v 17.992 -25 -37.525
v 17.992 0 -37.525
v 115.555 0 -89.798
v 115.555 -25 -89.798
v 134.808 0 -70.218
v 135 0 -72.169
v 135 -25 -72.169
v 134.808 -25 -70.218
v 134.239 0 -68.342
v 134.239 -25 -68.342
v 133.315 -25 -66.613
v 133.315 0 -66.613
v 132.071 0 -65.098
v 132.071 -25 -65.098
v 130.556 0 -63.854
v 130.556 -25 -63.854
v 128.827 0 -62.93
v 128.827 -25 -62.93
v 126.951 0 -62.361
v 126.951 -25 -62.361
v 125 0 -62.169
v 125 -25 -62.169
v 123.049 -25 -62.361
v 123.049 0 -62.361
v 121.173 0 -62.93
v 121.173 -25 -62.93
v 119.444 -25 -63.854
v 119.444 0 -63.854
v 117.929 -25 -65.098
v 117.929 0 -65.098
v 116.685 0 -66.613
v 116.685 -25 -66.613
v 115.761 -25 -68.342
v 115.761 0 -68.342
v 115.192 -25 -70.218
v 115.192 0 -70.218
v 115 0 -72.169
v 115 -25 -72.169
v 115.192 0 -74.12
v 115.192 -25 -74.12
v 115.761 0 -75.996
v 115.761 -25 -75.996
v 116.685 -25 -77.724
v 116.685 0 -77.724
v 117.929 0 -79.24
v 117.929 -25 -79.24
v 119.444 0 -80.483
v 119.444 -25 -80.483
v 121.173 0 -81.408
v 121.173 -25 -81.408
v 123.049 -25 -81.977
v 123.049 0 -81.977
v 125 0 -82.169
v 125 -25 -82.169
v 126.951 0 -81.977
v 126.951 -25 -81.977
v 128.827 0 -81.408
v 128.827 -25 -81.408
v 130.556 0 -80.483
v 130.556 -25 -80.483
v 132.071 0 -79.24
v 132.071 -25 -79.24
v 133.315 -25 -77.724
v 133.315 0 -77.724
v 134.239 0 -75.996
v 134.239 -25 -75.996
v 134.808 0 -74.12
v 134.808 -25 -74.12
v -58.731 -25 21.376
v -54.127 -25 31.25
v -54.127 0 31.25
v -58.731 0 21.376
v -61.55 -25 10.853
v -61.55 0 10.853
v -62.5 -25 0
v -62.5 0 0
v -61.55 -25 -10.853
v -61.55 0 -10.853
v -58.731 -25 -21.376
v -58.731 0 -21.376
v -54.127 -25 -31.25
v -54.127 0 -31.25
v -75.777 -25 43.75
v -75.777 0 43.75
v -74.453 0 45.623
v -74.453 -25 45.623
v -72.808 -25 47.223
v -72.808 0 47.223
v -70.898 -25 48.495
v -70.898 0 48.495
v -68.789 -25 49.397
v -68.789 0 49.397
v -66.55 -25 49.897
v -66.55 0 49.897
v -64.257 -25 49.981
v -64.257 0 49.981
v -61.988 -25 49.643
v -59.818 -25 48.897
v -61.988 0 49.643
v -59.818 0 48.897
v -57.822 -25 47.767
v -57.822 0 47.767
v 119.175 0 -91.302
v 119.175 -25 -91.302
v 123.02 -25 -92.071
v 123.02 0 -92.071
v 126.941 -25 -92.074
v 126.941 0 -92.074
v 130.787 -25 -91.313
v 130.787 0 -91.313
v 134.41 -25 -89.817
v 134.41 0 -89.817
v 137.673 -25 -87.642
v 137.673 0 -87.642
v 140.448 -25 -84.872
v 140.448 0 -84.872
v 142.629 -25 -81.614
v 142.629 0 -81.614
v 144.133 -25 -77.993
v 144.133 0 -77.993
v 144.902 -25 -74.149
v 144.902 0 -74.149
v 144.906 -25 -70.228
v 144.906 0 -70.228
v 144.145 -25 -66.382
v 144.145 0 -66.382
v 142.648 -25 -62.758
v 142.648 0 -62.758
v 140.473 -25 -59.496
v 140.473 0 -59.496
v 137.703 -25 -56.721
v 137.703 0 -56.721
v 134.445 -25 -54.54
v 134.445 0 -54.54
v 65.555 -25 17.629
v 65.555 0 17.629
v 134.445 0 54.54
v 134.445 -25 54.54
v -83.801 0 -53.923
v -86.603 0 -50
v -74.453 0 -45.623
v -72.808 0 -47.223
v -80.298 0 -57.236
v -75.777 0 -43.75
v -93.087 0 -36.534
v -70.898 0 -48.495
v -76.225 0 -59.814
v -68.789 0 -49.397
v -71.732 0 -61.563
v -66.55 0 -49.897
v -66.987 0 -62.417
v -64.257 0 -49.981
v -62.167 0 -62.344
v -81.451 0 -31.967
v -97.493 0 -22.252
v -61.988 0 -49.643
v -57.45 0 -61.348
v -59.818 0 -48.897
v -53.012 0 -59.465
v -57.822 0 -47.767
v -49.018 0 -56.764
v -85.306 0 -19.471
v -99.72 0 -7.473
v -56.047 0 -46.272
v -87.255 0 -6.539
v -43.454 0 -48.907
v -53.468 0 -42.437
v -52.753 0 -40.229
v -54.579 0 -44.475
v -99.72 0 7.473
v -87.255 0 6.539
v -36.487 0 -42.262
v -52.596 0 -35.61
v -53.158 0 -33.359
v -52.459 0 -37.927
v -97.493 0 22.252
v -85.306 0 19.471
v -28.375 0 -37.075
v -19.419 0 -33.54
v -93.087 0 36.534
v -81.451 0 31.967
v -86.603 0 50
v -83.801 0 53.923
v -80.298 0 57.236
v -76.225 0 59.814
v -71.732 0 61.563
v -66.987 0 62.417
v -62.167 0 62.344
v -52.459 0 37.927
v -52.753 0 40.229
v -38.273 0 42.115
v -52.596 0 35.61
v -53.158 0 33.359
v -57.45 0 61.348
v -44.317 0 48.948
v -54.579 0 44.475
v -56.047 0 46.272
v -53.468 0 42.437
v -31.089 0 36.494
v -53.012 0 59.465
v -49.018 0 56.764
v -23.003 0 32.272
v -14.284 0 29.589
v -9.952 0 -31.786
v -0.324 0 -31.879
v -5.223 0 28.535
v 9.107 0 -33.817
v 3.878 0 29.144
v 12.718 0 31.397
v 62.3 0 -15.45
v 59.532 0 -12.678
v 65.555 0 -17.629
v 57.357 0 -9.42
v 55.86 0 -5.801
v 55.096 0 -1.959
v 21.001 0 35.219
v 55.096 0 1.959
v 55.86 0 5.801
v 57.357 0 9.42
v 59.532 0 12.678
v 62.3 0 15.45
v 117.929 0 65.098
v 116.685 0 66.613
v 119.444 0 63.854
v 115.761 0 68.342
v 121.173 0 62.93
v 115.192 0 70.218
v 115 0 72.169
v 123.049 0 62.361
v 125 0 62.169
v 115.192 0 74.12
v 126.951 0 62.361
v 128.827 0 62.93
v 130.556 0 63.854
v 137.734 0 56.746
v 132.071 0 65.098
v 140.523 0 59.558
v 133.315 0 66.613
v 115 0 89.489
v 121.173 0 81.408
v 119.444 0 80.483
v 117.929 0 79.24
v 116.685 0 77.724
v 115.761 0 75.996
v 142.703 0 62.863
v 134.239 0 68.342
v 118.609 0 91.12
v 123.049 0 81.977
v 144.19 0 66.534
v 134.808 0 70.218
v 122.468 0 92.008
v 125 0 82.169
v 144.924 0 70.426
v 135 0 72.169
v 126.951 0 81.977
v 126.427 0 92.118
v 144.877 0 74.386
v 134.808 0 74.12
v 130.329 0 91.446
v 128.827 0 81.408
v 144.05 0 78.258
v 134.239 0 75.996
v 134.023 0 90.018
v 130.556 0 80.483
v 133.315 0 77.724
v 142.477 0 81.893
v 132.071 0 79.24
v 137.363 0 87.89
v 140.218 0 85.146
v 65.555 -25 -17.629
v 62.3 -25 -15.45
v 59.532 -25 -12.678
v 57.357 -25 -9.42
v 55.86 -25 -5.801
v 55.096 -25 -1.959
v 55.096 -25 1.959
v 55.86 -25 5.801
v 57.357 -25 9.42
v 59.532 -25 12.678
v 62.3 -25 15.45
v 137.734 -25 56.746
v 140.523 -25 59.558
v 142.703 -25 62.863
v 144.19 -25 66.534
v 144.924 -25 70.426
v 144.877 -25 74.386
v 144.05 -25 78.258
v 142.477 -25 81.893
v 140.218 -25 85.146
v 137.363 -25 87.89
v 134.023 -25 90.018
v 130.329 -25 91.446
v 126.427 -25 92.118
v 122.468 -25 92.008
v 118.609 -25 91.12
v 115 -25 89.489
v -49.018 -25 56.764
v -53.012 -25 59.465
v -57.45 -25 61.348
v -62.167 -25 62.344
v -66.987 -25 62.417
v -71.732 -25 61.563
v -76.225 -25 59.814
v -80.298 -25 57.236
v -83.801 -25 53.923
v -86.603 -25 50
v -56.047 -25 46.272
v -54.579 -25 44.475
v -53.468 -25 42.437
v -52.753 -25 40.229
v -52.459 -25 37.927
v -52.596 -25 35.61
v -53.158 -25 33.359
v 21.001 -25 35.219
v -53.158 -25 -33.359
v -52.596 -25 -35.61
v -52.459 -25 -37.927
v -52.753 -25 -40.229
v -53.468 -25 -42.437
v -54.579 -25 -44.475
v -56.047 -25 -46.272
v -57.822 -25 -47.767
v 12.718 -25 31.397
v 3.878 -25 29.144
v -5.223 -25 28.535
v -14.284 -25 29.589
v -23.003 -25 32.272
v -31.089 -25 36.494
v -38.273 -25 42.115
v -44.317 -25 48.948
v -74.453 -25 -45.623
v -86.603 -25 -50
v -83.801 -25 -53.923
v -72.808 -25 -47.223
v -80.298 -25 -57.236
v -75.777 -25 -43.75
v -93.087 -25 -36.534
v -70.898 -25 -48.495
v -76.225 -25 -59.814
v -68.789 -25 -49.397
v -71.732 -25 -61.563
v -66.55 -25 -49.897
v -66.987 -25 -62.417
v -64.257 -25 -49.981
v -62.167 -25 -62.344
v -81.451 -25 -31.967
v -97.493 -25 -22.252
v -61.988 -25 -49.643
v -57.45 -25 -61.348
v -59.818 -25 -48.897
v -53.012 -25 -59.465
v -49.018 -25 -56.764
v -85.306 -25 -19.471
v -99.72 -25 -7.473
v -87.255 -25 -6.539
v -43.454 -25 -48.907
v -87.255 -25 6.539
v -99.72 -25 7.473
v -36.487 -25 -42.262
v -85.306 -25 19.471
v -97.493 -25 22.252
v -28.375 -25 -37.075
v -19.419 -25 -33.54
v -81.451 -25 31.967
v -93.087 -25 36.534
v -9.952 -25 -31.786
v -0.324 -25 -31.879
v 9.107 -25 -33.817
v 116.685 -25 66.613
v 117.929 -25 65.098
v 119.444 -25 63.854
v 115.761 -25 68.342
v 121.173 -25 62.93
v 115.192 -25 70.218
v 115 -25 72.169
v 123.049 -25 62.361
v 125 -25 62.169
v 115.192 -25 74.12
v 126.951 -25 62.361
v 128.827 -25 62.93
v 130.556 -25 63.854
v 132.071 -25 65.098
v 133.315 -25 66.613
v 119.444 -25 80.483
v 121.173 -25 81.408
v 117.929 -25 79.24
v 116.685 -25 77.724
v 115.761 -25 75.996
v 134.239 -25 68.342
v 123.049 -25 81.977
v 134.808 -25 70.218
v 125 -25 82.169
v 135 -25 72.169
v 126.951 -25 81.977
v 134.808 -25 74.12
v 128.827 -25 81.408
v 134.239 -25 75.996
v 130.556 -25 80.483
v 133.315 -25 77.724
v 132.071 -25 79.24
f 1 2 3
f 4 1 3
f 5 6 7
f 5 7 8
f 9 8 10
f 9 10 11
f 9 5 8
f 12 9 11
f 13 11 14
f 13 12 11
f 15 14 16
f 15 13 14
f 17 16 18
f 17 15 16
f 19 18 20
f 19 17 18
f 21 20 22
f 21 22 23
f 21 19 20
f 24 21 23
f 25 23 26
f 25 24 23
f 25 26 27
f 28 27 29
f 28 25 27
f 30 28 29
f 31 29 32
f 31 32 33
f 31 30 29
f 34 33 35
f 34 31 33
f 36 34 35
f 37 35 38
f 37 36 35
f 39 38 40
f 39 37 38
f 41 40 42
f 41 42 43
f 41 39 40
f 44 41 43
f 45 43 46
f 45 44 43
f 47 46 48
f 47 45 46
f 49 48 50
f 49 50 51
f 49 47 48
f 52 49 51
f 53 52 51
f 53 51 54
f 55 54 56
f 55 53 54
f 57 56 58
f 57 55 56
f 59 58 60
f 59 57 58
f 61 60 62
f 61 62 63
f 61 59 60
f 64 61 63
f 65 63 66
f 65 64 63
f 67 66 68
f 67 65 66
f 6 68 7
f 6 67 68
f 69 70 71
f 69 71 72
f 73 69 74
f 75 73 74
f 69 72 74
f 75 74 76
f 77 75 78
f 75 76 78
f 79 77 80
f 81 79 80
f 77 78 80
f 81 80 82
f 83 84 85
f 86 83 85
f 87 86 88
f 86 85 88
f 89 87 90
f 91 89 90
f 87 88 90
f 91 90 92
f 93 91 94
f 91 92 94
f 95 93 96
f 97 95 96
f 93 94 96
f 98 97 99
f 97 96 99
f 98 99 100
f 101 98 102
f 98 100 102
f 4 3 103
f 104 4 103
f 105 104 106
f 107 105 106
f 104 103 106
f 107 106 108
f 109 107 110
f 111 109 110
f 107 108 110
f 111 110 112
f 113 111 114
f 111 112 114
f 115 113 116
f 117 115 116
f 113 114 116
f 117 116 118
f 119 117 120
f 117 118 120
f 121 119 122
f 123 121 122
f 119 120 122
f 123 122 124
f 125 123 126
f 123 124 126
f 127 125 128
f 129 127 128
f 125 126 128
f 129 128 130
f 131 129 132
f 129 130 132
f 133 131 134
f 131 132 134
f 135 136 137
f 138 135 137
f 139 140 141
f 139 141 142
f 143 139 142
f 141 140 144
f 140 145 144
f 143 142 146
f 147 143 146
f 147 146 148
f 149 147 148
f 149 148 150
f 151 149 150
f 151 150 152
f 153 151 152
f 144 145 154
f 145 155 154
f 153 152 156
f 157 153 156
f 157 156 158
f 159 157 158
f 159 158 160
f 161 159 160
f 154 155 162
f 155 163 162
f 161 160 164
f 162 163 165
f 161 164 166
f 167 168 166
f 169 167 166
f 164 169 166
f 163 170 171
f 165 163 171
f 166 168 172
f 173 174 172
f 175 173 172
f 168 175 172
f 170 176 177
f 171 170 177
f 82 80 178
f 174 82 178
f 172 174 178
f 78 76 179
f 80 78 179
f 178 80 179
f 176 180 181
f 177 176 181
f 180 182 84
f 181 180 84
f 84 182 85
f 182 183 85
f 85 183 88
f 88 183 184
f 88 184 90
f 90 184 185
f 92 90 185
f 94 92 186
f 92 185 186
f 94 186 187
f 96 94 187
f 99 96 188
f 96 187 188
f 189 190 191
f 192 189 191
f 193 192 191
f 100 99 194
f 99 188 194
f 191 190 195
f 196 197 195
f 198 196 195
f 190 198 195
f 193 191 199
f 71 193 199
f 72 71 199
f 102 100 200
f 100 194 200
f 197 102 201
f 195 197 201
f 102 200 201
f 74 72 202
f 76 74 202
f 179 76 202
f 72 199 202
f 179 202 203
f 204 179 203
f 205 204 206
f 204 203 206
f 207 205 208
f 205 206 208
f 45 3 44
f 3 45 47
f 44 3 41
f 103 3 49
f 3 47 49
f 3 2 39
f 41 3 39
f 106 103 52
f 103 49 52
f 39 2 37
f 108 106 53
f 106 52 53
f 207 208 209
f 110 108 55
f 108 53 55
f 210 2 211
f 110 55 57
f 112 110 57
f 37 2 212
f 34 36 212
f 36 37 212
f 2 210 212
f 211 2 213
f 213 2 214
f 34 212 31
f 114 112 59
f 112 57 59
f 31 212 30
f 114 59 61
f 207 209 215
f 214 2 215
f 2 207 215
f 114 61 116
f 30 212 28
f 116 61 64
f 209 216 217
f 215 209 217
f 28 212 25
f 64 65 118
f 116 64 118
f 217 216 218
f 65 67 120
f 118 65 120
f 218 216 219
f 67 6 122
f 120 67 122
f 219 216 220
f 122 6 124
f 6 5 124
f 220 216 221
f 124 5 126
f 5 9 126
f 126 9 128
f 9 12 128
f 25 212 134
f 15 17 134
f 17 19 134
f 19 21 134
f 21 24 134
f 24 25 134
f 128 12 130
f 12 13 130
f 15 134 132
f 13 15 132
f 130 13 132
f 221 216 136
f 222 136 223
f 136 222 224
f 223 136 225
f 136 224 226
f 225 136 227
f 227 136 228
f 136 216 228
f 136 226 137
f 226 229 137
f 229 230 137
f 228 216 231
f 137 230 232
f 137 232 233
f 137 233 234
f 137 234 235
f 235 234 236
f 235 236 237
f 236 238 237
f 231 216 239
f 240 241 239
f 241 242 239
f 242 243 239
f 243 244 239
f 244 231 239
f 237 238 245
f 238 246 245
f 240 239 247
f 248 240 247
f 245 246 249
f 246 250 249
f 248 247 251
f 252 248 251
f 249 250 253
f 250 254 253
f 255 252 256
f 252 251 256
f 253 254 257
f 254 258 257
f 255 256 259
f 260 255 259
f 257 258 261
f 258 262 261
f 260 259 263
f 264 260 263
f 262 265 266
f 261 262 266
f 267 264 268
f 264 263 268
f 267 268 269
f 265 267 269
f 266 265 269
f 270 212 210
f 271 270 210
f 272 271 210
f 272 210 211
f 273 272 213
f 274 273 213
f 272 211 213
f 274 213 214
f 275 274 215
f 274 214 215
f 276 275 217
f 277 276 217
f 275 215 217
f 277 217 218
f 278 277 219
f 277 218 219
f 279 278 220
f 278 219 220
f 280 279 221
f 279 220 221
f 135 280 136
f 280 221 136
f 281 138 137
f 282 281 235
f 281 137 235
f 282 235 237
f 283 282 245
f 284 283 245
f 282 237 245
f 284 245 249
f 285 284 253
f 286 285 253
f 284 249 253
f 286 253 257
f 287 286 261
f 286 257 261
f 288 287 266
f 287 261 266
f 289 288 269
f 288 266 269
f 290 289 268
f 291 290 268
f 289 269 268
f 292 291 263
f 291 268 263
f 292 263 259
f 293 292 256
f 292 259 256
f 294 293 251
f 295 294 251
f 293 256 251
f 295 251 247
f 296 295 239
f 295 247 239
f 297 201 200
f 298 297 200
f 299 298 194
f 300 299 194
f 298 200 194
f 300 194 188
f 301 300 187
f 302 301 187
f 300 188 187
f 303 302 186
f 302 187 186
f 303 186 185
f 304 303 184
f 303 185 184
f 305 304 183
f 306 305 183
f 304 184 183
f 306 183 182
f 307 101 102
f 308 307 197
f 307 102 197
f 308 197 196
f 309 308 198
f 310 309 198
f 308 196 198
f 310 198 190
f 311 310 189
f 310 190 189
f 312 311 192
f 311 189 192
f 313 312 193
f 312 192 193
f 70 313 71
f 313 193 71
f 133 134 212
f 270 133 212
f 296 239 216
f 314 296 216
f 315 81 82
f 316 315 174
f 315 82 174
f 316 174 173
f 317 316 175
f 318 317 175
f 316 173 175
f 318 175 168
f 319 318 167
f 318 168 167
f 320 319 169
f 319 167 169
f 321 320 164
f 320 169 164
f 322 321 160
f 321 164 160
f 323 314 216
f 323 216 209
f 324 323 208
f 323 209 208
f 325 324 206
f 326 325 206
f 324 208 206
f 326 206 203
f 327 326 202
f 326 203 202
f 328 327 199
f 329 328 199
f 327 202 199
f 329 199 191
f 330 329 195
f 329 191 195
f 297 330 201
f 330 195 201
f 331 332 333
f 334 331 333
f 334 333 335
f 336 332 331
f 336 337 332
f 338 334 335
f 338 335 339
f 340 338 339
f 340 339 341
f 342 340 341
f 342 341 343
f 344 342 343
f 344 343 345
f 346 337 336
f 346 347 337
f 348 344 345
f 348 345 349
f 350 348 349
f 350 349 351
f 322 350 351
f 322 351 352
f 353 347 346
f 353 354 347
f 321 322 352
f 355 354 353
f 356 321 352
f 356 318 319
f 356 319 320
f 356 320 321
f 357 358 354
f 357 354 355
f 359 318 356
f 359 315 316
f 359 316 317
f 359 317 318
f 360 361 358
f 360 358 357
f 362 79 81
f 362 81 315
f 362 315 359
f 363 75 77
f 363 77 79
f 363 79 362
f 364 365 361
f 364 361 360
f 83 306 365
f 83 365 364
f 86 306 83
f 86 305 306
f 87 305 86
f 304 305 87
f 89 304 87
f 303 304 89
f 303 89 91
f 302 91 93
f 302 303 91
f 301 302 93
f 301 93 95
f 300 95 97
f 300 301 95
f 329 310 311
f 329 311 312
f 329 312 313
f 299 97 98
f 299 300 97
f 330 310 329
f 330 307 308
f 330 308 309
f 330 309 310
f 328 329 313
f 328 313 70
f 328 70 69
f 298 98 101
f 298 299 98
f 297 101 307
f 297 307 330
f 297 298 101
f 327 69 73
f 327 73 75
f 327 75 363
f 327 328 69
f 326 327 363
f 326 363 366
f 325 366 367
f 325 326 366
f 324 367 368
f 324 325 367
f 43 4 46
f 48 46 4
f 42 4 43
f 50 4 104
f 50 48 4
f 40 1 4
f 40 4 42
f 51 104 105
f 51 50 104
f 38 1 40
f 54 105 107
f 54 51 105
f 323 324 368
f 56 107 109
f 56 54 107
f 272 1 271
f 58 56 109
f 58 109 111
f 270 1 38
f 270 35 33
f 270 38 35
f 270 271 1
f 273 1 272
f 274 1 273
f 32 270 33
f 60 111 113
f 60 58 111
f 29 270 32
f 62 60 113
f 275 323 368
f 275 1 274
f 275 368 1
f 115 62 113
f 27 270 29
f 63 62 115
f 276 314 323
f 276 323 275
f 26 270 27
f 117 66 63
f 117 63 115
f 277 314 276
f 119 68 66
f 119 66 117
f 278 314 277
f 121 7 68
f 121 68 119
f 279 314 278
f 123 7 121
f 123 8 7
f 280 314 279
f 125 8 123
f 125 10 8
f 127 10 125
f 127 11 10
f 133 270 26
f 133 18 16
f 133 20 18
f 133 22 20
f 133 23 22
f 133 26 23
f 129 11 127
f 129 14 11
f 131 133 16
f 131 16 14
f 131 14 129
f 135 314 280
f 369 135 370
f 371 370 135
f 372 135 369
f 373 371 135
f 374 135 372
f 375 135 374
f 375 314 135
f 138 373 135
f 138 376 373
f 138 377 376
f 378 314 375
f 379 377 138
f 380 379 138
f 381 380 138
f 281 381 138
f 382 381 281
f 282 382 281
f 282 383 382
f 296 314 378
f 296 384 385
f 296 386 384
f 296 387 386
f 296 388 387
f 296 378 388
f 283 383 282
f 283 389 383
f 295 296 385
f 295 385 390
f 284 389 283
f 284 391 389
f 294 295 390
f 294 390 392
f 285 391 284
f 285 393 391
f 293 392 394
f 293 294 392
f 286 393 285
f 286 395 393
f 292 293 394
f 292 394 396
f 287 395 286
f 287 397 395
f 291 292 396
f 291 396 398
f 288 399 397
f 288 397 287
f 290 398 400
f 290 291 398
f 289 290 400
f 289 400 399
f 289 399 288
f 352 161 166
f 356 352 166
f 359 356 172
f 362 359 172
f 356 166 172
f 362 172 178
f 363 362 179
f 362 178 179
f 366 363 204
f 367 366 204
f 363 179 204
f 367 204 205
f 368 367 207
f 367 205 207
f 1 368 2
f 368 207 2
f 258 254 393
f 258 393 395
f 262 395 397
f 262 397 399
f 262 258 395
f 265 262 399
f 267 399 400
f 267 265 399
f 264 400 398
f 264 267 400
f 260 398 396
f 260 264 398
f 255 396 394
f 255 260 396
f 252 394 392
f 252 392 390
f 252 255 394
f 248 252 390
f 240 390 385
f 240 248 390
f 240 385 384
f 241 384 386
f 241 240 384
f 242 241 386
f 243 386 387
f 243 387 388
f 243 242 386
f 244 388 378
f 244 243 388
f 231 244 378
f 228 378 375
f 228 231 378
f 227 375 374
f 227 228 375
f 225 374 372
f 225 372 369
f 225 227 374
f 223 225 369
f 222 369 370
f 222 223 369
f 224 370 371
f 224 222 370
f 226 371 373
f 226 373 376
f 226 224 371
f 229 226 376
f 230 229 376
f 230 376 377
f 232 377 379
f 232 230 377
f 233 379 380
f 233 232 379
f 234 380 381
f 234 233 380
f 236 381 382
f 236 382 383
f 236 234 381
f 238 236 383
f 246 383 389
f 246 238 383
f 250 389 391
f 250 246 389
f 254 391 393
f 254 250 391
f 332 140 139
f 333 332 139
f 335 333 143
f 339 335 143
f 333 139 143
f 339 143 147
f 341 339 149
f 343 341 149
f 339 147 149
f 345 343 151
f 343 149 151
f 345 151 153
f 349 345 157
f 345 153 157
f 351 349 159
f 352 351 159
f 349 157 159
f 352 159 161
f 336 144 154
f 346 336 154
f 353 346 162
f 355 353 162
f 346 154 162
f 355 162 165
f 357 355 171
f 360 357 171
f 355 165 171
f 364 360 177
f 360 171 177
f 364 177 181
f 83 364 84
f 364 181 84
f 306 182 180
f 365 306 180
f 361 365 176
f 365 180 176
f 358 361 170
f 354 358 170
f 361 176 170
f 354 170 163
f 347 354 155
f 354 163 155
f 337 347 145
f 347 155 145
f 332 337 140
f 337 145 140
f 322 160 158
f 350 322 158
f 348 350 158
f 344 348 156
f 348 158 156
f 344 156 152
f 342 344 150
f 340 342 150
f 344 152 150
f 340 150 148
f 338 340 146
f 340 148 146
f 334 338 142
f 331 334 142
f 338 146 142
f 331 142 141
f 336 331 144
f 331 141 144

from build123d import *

# Parameters (mm, degrees)
F0_R     = 10
F1_DEPTH = 25


with BuildPart() as f1:
    # F0 (on Front) → F1 (new body)
    with BuildSketch(Plane.XZ):
        with BuildLine():
            Line((65.554609, 17.629084), (134.445391, 54.5397))
            ThreePointArc((134.445391, 54.5397), (142.476996, 81.892703), (115, 89.489292))
            Line((115, 89.489292), (21.000572, 35.218697))
            ThreePointArc((21.000572, 35.218697), (-18.704666, 30.731307), (-49.0183, 56.764481))
            ThreePointArc((-49.0183, 56.764481), (-69.380297, 62.104661), (-86.60254, 50))
            ThreePointArc((-86.60254, 50), (-100, 0), (-86.60254, -50))
            ThreePointArc((-86.60254, -50), (-69.380297, -62.104661), (-49.0183, -56.764481))
            ThreePointArc((-49.0183, -56.764481), (-19.419281, -33.5396), (17.992089, -37.525377))
            Line((17.992089, -37.525377), (115.554609, -89.797867))
            ThreePointArc((115.554609, -89.797867), (142.629084, -81.614174), (134.445391, -54.5397))
            Line((134.445391, -54.5397), (65.554609, -17.629084))
            ThreePointArc((65.554609, -17.629084), (55, 0), (65.554609, 17.629084))
        make_face()
        with BuildLine():
            ThreePointArc((-75.777223, 43.75), (-67.680804, 49.698488), (-57.821535, 47.766831))
            ThreePointArc((-57.821535, 47.766831), (-52.753417, 40.228899), (-54.126588, 31.25))
            ThreePointArc((-54.126588, 31.25), (-62.5, 0), (-54.126588, -31.25))
            ThreePointArc((-54.126588, -31.25), (-52.753417, -40.228899), (-57.821535, -47.766831))
            ThreePointArc((-57.821535, -47.766831), (-67.680804, -49.698488), (-75.777223, -43.75))
            ThreePointArc((-75.777223, -43.75), (-87.5, 0), (-75.777223, 43.75))
        make_face(mode=Mode.SUBTRACT)
        with Locations((125, -72.168784)):
            Circle(F0_R, mode=Mode.SUBTRACT)
        with Locations((125, 72.168784)):
            Circle(F0_R, mode=Mode.SUBTRACT)
    extrude(amount=F1_DEPTH)


solid = f1.part
